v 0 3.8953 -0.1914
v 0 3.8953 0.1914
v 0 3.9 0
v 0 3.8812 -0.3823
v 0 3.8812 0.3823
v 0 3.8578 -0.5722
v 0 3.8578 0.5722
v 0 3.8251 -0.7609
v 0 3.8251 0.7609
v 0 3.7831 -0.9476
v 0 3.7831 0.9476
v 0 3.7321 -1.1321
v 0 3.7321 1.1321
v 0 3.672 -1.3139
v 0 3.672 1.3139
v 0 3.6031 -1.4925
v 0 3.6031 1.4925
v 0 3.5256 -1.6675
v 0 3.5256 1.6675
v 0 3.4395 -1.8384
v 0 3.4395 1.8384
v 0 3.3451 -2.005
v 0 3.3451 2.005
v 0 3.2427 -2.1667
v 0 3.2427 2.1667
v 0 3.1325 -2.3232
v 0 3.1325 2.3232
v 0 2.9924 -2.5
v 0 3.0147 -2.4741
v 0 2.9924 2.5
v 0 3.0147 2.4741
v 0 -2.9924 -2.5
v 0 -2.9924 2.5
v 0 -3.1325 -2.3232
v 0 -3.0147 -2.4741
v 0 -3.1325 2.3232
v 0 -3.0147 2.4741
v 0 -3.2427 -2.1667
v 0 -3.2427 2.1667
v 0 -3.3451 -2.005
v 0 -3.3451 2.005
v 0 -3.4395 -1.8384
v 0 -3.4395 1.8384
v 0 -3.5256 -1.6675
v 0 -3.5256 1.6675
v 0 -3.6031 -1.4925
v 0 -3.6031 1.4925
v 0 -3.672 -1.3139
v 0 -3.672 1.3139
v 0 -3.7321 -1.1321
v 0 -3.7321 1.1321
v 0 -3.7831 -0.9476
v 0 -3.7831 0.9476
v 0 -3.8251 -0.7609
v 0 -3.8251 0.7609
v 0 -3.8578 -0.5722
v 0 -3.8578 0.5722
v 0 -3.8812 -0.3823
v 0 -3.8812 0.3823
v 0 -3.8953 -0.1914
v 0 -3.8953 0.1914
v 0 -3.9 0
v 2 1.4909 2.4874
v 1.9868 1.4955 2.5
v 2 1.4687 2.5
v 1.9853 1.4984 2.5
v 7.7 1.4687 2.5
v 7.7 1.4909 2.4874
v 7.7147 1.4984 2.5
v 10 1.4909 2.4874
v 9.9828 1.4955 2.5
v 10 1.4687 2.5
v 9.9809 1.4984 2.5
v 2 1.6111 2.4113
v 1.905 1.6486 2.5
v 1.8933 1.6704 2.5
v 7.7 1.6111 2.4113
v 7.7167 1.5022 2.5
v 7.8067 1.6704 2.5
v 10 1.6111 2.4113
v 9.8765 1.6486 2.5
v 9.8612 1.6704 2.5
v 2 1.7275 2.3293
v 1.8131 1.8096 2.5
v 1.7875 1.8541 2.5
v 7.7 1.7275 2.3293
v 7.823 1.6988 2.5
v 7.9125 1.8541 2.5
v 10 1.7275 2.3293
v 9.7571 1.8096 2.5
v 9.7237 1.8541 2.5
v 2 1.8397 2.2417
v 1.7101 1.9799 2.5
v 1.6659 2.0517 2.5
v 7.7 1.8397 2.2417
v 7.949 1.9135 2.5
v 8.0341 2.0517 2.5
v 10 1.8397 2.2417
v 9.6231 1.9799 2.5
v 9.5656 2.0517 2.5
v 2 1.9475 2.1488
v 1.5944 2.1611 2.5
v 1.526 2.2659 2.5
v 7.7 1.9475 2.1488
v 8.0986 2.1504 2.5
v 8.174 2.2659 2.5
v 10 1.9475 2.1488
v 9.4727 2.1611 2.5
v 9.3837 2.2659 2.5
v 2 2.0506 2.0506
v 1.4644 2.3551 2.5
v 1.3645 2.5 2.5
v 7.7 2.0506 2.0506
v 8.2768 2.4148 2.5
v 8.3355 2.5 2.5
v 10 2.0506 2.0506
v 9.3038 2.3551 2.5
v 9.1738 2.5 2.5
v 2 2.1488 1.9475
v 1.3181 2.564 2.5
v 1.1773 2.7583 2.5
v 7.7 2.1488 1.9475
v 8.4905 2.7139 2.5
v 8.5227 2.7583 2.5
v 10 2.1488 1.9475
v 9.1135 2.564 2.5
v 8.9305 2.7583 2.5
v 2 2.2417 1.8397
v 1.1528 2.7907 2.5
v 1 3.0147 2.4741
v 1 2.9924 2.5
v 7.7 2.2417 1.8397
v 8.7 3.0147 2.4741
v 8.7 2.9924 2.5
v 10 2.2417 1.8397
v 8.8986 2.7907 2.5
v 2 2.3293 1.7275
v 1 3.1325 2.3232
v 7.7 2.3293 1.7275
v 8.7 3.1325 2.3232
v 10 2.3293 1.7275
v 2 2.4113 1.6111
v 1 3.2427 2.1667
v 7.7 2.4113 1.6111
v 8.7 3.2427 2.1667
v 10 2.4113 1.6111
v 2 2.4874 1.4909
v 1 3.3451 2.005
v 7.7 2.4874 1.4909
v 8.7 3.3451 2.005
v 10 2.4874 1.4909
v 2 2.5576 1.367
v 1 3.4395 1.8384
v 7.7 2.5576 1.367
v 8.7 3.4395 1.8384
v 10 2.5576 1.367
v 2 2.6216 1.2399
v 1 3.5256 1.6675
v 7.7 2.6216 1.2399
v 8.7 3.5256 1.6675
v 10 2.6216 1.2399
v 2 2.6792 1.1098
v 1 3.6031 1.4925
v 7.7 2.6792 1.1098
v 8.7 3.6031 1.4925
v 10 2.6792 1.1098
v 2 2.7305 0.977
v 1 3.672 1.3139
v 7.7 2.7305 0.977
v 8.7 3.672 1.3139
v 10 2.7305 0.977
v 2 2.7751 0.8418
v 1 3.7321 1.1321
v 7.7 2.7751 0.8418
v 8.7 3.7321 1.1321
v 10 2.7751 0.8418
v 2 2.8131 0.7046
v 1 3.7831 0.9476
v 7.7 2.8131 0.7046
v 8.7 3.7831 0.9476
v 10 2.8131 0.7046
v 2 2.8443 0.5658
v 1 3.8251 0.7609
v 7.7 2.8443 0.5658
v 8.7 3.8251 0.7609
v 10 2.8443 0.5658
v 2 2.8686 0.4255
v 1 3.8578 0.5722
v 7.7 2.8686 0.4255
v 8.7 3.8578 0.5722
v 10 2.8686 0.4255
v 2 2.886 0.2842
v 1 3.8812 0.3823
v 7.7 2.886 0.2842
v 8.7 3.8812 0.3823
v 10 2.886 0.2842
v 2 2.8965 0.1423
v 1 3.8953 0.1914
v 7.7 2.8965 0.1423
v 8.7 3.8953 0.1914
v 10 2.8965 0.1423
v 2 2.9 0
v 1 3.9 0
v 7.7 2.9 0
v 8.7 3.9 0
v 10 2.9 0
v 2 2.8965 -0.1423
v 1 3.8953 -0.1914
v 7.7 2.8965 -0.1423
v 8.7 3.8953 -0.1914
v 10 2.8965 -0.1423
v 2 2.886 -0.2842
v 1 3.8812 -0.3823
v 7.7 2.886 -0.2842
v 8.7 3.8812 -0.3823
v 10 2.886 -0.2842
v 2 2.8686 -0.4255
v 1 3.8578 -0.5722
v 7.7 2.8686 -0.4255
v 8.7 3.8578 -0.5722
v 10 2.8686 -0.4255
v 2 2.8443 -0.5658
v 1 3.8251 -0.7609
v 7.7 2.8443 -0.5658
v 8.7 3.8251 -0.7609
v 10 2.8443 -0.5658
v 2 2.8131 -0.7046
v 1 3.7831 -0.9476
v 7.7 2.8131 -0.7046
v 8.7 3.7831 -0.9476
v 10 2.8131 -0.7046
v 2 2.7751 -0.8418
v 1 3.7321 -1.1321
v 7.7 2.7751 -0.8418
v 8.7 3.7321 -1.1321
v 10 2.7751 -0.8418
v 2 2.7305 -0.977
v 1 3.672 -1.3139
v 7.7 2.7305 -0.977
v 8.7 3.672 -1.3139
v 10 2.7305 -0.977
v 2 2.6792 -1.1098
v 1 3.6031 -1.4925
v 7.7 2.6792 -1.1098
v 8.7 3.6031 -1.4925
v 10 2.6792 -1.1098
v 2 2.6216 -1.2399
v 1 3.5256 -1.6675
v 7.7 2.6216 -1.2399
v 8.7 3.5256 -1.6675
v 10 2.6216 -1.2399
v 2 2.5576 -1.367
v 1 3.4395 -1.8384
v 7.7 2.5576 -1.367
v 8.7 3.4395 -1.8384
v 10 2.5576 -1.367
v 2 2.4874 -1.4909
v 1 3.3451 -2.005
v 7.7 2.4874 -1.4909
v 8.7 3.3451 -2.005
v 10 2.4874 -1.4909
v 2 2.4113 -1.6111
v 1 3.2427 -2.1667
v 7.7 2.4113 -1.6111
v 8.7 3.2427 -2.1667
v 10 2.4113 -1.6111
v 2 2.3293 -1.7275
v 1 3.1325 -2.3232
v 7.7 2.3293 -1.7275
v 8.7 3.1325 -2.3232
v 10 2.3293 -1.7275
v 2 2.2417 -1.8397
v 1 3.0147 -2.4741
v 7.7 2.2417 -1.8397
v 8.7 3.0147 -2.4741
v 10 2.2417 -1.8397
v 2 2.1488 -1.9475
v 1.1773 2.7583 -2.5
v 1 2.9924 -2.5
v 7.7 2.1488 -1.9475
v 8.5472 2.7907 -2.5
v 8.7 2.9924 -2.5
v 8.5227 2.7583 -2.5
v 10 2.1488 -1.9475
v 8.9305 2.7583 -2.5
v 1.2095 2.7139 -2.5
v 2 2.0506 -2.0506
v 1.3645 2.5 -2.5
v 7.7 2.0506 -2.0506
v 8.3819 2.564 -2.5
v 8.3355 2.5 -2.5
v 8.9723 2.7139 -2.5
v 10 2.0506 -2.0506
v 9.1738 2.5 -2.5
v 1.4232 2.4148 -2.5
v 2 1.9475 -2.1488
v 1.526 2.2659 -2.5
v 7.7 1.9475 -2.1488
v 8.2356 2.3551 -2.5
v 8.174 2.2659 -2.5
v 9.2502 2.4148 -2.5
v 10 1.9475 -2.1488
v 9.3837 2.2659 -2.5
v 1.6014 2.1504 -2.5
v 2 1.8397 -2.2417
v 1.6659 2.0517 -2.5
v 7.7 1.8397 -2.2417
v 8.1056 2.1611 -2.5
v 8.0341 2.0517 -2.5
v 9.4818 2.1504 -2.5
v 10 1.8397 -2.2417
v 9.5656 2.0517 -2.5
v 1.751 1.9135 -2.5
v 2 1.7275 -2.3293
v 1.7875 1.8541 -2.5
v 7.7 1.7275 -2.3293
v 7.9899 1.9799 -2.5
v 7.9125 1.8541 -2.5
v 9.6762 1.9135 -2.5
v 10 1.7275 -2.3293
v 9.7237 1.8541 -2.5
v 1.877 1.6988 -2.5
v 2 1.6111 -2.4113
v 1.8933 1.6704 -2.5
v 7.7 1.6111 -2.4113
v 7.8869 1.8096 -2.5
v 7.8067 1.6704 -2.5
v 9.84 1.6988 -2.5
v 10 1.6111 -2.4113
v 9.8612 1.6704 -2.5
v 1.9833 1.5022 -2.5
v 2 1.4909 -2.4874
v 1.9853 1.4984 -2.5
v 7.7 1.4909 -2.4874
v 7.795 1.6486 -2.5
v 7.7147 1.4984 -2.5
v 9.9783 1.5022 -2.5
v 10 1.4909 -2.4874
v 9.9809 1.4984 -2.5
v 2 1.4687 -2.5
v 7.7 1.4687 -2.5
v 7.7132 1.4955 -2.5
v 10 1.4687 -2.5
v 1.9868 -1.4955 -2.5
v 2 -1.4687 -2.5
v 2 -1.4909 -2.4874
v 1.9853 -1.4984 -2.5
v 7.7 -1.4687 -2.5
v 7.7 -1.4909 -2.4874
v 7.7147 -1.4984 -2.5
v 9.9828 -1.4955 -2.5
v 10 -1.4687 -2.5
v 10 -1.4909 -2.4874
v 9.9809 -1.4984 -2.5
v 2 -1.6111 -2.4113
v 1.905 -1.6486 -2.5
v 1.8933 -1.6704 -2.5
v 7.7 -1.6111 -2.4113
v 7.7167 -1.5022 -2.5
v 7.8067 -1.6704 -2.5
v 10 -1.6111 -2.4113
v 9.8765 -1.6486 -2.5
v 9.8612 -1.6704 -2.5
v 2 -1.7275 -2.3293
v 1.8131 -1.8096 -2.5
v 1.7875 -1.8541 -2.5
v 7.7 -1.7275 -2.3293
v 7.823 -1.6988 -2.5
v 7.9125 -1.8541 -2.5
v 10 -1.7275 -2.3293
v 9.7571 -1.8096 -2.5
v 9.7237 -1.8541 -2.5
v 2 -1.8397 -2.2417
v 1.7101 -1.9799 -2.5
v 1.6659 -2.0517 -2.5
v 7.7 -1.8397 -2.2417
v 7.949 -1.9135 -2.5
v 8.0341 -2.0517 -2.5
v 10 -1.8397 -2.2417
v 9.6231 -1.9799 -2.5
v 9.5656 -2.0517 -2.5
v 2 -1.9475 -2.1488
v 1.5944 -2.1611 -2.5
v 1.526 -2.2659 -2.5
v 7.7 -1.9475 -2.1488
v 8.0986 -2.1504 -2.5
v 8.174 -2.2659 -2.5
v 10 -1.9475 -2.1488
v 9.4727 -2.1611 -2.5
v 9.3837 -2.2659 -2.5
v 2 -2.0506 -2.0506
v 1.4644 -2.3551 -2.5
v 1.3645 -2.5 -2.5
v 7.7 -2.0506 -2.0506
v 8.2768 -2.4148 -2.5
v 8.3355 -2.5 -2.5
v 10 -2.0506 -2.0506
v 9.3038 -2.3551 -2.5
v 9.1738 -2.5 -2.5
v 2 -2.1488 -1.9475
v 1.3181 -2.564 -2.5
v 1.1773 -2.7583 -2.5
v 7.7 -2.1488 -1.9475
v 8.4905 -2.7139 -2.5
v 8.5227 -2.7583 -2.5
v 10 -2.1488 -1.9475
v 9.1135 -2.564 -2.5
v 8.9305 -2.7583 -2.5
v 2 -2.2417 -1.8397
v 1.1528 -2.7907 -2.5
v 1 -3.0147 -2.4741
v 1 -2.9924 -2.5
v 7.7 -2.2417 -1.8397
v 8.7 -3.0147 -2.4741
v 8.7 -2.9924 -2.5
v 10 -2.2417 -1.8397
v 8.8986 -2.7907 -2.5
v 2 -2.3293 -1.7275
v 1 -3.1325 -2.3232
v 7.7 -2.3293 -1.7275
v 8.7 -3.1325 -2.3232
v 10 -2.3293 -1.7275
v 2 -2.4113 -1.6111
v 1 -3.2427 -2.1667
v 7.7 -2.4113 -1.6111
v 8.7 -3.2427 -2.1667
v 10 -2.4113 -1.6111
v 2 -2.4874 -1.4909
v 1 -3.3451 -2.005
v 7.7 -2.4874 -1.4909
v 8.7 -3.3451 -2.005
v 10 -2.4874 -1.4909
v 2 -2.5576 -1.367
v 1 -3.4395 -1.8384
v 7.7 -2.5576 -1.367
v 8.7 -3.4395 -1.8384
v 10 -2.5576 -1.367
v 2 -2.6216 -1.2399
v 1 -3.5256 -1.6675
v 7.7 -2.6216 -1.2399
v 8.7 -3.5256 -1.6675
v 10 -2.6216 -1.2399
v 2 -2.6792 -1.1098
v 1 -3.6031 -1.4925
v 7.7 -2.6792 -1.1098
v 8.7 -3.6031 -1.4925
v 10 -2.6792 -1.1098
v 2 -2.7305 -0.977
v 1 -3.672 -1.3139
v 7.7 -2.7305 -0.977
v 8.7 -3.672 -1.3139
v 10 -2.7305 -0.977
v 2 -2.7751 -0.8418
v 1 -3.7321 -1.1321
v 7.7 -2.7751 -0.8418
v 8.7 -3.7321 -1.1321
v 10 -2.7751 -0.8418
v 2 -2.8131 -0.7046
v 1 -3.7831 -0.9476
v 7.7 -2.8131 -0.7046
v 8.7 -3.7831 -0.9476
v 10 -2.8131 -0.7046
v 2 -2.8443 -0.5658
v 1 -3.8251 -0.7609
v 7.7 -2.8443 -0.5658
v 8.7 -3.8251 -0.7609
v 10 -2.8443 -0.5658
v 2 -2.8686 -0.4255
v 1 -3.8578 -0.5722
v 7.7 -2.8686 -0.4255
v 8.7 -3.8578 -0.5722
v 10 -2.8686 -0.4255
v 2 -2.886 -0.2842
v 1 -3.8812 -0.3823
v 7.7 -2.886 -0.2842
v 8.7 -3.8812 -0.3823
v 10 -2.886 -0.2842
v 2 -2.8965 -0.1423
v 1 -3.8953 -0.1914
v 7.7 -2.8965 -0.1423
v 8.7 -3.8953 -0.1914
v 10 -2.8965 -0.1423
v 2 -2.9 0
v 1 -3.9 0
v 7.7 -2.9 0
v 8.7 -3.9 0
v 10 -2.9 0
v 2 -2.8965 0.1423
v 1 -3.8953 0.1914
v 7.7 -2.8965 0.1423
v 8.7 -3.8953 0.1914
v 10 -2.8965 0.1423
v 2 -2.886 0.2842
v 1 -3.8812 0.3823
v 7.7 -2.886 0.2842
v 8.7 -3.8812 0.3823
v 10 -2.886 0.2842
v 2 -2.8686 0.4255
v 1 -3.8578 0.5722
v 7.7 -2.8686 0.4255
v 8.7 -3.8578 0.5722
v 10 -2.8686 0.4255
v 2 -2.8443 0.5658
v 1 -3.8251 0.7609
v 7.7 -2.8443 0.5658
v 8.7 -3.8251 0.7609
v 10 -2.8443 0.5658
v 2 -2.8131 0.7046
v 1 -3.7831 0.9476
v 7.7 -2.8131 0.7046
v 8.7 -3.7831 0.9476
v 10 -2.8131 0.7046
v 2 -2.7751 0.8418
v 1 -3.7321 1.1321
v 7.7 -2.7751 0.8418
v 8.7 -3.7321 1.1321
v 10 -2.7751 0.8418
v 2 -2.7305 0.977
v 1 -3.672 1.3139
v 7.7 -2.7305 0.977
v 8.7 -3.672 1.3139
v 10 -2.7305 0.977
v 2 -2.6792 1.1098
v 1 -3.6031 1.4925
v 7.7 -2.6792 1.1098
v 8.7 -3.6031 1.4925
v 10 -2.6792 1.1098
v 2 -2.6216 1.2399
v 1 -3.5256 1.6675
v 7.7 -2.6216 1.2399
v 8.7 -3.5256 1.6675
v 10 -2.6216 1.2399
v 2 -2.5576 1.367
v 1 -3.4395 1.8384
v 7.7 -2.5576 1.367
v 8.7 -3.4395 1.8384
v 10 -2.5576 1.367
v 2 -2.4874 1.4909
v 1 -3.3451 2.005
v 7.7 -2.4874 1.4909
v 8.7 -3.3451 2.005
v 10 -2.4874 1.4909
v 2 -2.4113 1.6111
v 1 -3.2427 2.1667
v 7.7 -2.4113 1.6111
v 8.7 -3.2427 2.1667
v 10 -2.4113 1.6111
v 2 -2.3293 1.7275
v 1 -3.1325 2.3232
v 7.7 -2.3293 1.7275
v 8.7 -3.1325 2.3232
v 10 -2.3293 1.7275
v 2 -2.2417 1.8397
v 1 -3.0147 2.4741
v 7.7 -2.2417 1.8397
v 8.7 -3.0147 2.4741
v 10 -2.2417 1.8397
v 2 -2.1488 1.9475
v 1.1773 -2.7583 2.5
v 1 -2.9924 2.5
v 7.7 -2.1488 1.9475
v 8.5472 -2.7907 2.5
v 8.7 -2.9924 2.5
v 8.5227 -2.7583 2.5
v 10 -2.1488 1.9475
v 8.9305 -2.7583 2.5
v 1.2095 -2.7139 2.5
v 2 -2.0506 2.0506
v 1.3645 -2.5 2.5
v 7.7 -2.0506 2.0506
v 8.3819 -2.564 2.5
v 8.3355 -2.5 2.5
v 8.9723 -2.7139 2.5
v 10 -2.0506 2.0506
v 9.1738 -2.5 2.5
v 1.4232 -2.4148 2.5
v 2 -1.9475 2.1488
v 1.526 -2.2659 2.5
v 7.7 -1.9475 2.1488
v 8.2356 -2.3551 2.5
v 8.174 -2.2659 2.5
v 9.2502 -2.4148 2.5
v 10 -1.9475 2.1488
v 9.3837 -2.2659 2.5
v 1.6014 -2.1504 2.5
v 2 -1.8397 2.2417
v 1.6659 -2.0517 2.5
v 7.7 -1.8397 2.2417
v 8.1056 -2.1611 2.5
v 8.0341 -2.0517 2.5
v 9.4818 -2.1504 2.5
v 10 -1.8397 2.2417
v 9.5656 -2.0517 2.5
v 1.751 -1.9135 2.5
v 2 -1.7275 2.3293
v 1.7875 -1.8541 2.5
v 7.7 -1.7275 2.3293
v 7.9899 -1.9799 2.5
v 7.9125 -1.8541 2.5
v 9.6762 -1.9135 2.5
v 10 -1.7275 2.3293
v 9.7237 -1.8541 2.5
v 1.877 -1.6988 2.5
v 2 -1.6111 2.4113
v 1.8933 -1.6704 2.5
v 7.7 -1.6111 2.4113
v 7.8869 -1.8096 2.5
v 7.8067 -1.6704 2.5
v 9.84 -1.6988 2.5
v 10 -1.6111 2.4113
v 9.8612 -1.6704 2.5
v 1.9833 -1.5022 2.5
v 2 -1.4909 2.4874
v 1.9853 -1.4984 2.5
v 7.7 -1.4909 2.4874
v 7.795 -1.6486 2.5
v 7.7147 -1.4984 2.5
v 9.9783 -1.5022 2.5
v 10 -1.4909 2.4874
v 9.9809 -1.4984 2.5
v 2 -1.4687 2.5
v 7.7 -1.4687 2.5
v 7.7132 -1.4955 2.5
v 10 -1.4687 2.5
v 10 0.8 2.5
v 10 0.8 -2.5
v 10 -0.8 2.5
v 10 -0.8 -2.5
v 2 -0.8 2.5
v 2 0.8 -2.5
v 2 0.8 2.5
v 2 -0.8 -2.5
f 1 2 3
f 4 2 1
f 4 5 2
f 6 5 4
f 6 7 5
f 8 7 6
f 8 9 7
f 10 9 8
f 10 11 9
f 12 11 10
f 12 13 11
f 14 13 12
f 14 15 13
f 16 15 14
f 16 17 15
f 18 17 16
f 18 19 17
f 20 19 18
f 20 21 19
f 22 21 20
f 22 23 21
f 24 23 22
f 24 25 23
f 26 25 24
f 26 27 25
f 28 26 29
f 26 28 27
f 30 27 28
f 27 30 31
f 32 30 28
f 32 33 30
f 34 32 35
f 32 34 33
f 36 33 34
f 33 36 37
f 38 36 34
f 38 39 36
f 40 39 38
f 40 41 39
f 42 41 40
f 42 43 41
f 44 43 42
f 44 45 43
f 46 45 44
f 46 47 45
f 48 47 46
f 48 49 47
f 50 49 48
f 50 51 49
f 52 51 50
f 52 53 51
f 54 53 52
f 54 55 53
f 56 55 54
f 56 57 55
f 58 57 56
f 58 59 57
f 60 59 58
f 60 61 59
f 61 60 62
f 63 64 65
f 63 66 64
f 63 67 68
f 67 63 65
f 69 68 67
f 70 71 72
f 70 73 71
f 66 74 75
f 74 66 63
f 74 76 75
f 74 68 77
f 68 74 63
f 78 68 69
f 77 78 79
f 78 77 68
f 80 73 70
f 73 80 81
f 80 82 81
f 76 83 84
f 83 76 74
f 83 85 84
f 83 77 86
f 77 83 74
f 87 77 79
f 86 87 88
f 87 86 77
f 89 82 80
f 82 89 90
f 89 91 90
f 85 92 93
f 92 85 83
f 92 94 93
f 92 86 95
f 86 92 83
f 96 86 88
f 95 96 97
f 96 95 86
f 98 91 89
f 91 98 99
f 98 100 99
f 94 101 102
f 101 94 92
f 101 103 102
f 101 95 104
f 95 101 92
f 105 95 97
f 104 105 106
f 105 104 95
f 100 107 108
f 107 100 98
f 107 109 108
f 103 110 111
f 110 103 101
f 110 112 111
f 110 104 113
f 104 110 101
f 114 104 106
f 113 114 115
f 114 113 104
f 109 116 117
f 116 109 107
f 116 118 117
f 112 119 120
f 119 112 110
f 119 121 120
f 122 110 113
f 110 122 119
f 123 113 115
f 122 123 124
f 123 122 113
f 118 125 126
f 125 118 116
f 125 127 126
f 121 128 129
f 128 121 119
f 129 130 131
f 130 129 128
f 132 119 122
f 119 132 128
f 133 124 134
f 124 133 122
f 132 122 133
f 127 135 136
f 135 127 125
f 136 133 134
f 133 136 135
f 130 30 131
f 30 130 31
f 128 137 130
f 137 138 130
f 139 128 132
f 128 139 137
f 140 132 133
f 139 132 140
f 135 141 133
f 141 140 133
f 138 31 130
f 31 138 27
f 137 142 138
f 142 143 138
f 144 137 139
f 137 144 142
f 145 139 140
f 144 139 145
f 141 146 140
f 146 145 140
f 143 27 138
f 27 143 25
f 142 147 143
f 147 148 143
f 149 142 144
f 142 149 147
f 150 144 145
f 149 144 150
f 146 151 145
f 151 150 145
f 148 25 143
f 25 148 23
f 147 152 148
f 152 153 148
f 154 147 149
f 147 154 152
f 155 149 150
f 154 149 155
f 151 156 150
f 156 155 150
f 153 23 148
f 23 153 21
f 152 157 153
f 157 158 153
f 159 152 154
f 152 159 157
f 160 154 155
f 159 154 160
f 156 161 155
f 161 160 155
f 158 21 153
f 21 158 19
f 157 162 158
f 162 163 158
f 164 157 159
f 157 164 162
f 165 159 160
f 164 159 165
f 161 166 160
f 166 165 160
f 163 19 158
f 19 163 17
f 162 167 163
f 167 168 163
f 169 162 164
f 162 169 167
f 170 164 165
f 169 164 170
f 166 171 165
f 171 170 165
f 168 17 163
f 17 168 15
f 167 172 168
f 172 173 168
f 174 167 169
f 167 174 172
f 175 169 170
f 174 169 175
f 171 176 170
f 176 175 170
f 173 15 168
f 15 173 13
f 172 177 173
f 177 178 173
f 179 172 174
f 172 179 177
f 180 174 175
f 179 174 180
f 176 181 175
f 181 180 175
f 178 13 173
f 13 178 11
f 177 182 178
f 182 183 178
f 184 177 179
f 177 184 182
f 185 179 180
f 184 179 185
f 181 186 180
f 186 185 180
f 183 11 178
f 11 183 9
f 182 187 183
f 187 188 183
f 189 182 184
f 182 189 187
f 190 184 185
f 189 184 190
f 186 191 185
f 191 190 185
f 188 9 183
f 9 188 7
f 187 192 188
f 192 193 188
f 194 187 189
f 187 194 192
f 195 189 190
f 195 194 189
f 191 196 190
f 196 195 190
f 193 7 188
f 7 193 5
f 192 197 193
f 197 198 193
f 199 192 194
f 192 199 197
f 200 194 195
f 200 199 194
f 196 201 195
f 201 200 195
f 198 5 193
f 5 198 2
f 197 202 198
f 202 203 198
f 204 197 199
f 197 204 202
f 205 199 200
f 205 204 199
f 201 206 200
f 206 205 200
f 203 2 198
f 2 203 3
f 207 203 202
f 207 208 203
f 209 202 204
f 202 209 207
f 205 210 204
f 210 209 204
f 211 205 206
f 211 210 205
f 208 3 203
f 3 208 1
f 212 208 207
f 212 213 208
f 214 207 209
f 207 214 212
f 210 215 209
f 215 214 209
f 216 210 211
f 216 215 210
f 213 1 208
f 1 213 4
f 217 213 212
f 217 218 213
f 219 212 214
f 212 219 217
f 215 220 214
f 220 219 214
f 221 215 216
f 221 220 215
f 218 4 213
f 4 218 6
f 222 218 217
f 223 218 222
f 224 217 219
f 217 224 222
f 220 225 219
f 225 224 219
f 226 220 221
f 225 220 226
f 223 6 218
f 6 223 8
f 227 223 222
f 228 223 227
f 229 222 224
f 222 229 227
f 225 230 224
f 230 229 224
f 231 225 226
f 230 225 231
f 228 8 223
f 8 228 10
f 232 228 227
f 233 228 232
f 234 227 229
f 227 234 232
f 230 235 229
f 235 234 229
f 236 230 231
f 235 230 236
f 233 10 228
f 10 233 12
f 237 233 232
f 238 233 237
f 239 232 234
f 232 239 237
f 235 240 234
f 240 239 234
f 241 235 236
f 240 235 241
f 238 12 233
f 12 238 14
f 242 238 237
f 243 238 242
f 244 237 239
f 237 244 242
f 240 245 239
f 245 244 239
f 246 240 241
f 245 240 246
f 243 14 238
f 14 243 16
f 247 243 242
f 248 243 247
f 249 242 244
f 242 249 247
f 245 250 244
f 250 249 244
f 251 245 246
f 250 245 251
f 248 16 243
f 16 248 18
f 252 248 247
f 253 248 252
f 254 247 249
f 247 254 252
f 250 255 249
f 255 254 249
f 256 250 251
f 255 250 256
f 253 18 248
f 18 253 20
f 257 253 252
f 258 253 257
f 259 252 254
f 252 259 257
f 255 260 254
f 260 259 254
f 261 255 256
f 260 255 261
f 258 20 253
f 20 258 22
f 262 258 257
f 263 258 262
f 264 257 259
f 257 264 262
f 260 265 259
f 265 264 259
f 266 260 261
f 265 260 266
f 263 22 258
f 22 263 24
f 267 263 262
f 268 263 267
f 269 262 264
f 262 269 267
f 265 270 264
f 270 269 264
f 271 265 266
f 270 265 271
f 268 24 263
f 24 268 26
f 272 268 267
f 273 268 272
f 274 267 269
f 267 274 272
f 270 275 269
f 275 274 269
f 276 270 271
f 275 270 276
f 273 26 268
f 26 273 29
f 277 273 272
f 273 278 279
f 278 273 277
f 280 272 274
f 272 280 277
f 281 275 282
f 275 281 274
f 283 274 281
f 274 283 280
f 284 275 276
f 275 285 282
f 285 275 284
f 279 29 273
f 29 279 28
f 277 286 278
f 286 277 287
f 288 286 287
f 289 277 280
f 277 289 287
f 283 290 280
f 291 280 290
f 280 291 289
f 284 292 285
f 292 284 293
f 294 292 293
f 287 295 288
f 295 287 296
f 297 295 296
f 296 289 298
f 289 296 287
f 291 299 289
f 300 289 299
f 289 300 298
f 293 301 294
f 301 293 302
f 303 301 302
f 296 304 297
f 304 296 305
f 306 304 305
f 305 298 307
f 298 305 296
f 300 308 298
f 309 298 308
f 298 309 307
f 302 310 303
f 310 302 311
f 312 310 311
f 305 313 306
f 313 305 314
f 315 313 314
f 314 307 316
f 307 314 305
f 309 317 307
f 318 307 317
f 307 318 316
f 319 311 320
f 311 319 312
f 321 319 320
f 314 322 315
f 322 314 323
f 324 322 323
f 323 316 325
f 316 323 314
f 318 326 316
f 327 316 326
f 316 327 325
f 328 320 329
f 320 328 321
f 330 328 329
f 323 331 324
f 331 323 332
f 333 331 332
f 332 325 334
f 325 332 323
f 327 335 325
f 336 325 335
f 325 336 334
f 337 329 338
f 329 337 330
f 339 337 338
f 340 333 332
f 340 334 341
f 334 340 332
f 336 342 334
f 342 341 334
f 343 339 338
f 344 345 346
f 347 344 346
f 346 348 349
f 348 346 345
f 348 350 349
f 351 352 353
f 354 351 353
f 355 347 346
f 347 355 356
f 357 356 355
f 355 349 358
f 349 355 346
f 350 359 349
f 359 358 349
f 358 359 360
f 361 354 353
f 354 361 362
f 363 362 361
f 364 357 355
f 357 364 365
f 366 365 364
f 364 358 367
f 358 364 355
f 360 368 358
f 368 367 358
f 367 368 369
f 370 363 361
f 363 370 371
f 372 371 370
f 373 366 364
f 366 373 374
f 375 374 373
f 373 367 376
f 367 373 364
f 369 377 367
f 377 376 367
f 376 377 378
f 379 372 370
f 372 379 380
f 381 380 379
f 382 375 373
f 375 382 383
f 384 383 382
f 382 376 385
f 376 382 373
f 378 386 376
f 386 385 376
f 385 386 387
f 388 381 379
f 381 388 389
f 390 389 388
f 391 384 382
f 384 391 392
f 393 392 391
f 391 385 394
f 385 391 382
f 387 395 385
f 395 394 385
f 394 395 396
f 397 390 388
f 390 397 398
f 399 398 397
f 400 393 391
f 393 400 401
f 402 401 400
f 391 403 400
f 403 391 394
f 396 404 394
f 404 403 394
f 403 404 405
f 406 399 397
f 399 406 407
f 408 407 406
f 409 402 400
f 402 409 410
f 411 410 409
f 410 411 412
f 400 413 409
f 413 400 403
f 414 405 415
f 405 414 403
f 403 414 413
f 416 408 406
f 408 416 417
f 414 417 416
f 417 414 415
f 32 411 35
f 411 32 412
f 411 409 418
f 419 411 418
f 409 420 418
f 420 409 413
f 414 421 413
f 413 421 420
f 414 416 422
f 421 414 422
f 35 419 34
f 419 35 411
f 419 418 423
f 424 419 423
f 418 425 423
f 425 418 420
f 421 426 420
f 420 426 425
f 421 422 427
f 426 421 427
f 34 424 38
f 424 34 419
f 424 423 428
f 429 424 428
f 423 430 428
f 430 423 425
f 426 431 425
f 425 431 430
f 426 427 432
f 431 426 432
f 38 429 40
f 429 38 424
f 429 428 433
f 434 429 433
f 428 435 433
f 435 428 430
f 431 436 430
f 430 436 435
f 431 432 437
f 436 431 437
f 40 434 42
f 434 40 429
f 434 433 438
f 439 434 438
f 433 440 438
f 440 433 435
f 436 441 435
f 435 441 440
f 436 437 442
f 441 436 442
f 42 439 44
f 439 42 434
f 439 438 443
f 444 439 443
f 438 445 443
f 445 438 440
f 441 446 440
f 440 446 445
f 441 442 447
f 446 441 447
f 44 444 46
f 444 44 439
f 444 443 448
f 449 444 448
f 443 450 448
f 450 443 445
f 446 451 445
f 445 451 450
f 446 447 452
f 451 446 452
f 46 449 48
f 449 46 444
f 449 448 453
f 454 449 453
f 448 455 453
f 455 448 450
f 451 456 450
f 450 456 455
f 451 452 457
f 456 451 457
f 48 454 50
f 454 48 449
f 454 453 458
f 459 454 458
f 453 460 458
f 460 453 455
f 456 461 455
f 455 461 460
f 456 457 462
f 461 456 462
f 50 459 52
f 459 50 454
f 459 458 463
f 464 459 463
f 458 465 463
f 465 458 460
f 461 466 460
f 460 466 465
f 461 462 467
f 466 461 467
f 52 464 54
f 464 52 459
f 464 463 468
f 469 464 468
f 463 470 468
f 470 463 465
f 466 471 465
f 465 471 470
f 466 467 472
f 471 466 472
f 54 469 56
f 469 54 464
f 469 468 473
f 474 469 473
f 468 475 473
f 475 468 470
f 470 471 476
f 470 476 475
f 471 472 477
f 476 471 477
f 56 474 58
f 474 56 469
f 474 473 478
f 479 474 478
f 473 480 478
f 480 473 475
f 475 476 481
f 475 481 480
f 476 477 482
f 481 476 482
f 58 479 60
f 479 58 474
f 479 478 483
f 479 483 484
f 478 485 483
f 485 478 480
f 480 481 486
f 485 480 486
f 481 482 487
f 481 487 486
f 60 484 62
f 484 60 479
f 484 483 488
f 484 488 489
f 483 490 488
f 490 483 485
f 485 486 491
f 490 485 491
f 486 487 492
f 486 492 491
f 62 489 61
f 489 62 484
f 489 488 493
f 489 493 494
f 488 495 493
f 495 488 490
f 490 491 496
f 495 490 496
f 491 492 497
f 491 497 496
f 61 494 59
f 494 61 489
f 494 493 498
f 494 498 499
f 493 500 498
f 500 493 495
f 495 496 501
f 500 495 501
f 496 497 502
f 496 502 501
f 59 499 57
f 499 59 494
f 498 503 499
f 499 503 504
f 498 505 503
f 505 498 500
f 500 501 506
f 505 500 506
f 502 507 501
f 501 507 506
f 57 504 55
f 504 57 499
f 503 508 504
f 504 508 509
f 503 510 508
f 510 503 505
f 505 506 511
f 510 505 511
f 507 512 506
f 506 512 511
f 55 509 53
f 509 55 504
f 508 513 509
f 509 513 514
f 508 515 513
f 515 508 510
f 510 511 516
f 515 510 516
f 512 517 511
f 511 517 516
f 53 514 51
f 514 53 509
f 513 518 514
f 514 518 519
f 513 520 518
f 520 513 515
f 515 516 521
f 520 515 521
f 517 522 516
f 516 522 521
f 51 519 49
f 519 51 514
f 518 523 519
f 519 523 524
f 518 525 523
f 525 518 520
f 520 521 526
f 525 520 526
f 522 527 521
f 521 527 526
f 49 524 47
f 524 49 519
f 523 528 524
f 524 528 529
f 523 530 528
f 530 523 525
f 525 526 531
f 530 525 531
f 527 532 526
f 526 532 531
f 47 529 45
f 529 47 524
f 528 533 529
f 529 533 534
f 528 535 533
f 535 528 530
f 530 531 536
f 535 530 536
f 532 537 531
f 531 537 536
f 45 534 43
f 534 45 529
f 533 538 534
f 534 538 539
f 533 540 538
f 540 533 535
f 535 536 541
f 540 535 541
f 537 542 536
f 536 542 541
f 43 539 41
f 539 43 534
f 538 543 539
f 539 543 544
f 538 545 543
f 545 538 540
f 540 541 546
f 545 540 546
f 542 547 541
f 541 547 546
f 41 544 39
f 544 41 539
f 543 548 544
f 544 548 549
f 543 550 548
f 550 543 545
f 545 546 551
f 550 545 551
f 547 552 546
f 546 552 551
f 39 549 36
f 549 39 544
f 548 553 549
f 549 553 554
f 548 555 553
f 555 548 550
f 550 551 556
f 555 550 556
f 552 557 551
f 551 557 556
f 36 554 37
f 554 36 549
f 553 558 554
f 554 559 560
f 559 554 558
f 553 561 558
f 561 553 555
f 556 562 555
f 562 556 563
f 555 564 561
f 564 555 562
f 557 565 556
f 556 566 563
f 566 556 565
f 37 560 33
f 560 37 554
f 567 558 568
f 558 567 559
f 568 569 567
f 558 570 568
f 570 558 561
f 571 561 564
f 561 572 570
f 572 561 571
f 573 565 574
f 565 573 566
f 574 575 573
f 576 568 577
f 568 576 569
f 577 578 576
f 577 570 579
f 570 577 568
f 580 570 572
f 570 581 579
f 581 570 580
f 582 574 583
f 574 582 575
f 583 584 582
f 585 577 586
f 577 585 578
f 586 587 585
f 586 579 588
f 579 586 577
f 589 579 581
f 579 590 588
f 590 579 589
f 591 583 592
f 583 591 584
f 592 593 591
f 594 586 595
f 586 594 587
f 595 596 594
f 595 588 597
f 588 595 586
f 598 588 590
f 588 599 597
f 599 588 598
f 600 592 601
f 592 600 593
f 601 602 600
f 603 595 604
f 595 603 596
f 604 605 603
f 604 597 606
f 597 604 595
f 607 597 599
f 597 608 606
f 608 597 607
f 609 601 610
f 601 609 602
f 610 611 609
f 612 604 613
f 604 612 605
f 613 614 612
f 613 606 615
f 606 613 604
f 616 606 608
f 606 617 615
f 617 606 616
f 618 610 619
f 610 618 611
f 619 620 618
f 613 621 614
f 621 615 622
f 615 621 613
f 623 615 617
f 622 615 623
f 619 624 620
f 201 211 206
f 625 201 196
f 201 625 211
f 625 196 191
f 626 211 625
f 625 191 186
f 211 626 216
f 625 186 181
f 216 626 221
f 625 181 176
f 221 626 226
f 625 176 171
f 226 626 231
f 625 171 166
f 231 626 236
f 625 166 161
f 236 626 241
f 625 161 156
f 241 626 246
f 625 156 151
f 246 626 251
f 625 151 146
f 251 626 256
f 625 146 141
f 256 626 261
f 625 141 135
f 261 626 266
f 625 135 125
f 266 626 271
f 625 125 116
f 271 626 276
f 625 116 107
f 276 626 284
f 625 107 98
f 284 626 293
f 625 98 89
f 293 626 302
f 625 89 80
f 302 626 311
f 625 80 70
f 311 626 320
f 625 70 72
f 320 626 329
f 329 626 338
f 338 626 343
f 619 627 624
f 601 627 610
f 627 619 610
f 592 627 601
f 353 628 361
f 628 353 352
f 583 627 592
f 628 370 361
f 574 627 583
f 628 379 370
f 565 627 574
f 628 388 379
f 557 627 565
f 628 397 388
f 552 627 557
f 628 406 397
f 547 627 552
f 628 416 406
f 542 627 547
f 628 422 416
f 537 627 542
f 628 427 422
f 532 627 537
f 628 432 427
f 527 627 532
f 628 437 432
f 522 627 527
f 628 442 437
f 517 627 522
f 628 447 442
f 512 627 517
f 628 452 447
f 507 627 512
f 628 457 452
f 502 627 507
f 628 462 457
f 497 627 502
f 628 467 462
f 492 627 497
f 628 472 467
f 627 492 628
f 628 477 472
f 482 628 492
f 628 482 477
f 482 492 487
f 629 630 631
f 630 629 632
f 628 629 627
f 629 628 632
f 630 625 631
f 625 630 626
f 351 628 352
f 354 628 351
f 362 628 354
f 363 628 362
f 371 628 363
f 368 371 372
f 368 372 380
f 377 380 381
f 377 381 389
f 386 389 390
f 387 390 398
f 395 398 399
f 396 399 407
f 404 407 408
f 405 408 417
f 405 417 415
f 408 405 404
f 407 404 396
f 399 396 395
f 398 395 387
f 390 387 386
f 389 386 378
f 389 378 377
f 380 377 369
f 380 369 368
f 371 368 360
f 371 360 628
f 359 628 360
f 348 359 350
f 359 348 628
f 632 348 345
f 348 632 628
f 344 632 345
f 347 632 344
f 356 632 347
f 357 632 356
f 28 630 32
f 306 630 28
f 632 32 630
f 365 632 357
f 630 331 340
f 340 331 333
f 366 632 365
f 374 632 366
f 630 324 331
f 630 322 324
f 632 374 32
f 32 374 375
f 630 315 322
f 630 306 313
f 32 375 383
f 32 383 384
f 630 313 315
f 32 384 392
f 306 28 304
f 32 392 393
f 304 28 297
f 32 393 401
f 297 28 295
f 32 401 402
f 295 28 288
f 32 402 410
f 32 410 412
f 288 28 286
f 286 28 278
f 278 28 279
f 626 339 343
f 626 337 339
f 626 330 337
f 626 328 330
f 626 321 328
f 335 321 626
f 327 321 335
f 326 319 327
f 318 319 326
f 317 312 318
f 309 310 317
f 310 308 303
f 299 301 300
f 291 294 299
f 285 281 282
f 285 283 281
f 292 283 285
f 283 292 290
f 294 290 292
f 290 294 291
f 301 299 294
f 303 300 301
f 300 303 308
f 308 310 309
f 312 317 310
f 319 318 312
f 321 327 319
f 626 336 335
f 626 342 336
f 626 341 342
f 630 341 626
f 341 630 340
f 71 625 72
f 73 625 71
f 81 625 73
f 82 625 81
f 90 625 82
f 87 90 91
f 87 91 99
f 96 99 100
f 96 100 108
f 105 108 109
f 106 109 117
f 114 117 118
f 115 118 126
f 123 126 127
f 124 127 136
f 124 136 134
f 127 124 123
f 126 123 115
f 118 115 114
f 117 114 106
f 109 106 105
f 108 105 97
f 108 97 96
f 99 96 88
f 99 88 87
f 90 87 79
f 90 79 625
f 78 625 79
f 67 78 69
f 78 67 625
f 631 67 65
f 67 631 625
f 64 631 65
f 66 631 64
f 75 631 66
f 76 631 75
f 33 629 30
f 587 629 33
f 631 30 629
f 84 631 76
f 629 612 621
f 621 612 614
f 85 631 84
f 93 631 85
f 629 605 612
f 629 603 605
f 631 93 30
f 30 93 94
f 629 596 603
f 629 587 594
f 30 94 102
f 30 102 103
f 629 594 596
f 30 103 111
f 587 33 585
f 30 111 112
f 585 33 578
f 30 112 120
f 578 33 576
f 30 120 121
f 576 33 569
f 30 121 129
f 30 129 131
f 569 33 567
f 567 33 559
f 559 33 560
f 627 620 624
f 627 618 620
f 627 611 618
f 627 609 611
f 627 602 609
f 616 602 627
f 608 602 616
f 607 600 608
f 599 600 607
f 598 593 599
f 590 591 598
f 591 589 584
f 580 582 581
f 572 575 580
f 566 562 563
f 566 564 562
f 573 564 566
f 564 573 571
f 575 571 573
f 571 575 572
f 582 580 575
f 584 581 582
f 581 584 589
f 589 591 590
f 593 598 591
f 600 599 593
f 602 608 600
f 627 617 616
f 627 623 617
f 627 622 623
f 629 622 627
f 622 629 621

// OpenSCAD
rotate([0.0, 90.0, 0.0])
{
    intersection()
    {
        difference()
        {
            rotate_extrude(angle = 360.0, $fn = 128)
            {
                M71();
            }
            translate([0.0, 0.0, 2.0])
            {
                linear_extrude(height = 10.0, twist = 0.0, scale = 1.0, slices = 1, center = false)
                {
                    scale([10.0, 1.6])
                    {
                        M8();
                    }
                }
            }
        }
        linear_extrude(height = 10.0, twist = 0.0, scale = 1.0, slices = 1, center = false)
        {
            scale([5.0, 10.0])
            {
                M8();
            }
        }
    }
}

module M71()
{
    polygon
    (
        points =
        [
            [0.0, 0.0], 
            [3.9, 0.0], 
            [3.9, 1.0], 
            [2.9, 2.0], 
            [2.9, 7.7], 
            [3.9, 8.7], 
            [2.9, 10.0], 
            [0.0, 10.0], 
            [0.0, 2.0]
        ],
        paths =
        [
            [0, 1, 2, 3, 4, 5, 6, 7, 8]
        ]
    );
}

module M8()
{
    polygon
    (
        points =
        [
            [-0.5, -0.5], 
            [0.5, -0.5], 
            [0.5, 0.5], 
            [-0.5, 0.5]
        ],
        paths =
        [
            [0, 1, 2, 3]
        ]
    );
}
